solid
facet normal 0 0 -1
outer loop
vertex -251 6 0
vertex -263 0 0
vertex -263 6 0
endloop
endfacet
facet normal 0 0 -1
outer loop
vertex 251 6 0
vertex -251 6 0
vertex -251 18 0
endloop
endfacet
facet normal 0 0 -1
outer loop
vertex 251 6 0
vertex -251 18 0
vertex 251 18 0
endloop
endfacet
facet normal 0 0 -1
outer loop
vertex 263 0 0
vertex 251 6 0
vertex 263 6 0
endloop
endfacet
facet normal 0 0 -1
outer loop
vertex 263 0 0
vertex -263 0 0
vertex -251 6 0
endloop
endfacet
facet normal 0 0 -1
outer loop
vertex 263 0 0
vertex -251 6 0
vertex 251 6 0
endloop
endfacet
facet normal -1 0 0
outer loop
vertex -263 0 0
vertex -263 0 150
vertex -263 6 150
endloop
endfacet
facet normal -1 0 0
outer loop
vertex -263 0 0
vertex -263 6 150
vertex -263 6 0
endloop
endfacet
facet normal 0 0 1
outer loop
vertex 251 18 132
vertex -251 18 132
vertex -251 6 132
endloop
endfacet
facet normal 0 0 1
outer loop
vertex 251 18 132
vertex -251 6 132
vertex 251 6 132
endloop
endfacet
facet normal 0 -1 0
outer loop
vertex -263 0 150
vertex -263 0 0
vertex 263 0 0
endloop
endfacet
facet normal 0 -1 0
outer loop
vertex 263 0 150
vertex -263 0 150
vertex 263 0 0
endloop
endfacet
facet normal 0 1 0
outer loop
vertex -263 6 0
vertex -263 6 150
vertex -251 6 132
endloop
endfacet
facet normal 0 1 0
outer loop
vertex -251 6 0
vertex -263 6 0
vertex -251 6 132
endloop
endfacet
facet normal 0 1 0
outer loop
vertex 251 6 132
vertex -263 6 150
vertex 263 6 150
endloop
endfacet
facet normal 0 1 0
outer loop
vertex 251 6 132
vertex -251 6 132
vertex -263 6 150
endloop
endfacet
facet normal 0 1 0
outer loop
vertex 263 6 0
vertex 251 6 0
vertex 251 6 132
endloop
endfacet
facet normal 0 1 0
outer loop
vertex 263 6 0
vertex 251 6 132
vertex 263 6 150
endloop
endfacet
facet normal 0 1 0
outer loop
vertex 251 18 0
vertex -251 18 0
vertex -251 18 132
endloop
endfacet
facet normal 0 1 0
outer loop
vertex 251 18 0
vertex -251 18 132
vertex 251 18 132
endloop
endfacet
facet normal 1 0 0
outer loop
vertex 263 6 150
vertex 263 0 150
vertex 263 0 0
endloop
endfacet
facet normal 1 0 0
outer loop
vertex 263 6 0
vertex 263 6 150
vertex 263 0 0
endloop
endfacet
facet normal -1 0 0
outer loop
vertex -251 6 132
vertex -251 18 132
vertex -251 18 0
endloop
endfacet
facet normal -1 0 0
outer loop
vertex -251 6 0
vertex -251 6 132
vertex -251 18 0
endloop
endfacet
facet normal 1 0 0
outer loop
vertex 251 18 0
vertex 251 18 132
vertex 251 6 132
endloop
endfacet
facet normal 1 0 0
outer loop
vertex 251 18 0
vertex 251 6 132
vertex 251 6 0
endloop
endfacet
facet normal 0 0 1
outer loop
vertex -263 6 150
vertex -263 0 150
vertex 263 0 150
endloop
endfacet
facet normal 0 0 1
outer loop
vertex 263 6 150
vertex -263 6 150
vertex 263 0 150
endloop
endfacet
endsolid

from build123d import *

# Parameters (mm, degrees)
SKETCH026_W             = 526
SKETCH026_H             = 150
PAD010_DEPTH            = 18
SKETCH027_W             = 12
SKETCH027_H             = 150
POCKET016_DEPTH         = 12
SKETCH031_W             = 526
SKETCH031_H             = 18
POCKET019_DEPTH         = 12
BODY009_PLACEMENT_ANGLE = 90


with BuildPart() as part:
    # Sketch026 → Pad010 (new body)
    with BuildSketch(Plane.XY):
        with Locations((0, 75)):
            Rectangle(SKETCH026_W, SKETCH026_H)
    extrude(amount=PAD010_DEPTH)

    # Sketch027 (on Face6 of Pad010) → Pocket016 (cut)
    with BuildSketch(Plane.XY.offset(18)):
        with Locations((-257, 75)):
            Rectangle(SKETCH027_W, SKETCH027_H)
    pocket016 = extrude(amount=-POCKET016_DEPTH, mode=Mode.SUBTRACT)

    # Mirrored007: Pocket016 across Sketch027 V_Axis
    add(pocket016.mirror(Plane(origin=(0, 0, 18), x_dir=(0, 0, 1), z_dir=(1, 0, 0))), mode=Mode.SUBTRACT)

    # Sketch031 (on Face6 of Mirrored007) → Pocket019 (cut)
    with BuildSketch(Plane.XY.offset(18)):
        with Locations((0, 9)):
            Rectangle(SKETCH031_W, SKETCH031_H)
    extrude(amount=-POCKET019_DEPTH, mode=Mode.SUBTRACT)


with BuildPart() as part_1:
    # Body009 placement: moved
    add(part.part.moved(Location((0, 0, 150))).rotate(Axis((0, 0, 150), (-1, 0, 0)), BODY009_PLACEMENT_ANGLE))


solid = part_1.part
